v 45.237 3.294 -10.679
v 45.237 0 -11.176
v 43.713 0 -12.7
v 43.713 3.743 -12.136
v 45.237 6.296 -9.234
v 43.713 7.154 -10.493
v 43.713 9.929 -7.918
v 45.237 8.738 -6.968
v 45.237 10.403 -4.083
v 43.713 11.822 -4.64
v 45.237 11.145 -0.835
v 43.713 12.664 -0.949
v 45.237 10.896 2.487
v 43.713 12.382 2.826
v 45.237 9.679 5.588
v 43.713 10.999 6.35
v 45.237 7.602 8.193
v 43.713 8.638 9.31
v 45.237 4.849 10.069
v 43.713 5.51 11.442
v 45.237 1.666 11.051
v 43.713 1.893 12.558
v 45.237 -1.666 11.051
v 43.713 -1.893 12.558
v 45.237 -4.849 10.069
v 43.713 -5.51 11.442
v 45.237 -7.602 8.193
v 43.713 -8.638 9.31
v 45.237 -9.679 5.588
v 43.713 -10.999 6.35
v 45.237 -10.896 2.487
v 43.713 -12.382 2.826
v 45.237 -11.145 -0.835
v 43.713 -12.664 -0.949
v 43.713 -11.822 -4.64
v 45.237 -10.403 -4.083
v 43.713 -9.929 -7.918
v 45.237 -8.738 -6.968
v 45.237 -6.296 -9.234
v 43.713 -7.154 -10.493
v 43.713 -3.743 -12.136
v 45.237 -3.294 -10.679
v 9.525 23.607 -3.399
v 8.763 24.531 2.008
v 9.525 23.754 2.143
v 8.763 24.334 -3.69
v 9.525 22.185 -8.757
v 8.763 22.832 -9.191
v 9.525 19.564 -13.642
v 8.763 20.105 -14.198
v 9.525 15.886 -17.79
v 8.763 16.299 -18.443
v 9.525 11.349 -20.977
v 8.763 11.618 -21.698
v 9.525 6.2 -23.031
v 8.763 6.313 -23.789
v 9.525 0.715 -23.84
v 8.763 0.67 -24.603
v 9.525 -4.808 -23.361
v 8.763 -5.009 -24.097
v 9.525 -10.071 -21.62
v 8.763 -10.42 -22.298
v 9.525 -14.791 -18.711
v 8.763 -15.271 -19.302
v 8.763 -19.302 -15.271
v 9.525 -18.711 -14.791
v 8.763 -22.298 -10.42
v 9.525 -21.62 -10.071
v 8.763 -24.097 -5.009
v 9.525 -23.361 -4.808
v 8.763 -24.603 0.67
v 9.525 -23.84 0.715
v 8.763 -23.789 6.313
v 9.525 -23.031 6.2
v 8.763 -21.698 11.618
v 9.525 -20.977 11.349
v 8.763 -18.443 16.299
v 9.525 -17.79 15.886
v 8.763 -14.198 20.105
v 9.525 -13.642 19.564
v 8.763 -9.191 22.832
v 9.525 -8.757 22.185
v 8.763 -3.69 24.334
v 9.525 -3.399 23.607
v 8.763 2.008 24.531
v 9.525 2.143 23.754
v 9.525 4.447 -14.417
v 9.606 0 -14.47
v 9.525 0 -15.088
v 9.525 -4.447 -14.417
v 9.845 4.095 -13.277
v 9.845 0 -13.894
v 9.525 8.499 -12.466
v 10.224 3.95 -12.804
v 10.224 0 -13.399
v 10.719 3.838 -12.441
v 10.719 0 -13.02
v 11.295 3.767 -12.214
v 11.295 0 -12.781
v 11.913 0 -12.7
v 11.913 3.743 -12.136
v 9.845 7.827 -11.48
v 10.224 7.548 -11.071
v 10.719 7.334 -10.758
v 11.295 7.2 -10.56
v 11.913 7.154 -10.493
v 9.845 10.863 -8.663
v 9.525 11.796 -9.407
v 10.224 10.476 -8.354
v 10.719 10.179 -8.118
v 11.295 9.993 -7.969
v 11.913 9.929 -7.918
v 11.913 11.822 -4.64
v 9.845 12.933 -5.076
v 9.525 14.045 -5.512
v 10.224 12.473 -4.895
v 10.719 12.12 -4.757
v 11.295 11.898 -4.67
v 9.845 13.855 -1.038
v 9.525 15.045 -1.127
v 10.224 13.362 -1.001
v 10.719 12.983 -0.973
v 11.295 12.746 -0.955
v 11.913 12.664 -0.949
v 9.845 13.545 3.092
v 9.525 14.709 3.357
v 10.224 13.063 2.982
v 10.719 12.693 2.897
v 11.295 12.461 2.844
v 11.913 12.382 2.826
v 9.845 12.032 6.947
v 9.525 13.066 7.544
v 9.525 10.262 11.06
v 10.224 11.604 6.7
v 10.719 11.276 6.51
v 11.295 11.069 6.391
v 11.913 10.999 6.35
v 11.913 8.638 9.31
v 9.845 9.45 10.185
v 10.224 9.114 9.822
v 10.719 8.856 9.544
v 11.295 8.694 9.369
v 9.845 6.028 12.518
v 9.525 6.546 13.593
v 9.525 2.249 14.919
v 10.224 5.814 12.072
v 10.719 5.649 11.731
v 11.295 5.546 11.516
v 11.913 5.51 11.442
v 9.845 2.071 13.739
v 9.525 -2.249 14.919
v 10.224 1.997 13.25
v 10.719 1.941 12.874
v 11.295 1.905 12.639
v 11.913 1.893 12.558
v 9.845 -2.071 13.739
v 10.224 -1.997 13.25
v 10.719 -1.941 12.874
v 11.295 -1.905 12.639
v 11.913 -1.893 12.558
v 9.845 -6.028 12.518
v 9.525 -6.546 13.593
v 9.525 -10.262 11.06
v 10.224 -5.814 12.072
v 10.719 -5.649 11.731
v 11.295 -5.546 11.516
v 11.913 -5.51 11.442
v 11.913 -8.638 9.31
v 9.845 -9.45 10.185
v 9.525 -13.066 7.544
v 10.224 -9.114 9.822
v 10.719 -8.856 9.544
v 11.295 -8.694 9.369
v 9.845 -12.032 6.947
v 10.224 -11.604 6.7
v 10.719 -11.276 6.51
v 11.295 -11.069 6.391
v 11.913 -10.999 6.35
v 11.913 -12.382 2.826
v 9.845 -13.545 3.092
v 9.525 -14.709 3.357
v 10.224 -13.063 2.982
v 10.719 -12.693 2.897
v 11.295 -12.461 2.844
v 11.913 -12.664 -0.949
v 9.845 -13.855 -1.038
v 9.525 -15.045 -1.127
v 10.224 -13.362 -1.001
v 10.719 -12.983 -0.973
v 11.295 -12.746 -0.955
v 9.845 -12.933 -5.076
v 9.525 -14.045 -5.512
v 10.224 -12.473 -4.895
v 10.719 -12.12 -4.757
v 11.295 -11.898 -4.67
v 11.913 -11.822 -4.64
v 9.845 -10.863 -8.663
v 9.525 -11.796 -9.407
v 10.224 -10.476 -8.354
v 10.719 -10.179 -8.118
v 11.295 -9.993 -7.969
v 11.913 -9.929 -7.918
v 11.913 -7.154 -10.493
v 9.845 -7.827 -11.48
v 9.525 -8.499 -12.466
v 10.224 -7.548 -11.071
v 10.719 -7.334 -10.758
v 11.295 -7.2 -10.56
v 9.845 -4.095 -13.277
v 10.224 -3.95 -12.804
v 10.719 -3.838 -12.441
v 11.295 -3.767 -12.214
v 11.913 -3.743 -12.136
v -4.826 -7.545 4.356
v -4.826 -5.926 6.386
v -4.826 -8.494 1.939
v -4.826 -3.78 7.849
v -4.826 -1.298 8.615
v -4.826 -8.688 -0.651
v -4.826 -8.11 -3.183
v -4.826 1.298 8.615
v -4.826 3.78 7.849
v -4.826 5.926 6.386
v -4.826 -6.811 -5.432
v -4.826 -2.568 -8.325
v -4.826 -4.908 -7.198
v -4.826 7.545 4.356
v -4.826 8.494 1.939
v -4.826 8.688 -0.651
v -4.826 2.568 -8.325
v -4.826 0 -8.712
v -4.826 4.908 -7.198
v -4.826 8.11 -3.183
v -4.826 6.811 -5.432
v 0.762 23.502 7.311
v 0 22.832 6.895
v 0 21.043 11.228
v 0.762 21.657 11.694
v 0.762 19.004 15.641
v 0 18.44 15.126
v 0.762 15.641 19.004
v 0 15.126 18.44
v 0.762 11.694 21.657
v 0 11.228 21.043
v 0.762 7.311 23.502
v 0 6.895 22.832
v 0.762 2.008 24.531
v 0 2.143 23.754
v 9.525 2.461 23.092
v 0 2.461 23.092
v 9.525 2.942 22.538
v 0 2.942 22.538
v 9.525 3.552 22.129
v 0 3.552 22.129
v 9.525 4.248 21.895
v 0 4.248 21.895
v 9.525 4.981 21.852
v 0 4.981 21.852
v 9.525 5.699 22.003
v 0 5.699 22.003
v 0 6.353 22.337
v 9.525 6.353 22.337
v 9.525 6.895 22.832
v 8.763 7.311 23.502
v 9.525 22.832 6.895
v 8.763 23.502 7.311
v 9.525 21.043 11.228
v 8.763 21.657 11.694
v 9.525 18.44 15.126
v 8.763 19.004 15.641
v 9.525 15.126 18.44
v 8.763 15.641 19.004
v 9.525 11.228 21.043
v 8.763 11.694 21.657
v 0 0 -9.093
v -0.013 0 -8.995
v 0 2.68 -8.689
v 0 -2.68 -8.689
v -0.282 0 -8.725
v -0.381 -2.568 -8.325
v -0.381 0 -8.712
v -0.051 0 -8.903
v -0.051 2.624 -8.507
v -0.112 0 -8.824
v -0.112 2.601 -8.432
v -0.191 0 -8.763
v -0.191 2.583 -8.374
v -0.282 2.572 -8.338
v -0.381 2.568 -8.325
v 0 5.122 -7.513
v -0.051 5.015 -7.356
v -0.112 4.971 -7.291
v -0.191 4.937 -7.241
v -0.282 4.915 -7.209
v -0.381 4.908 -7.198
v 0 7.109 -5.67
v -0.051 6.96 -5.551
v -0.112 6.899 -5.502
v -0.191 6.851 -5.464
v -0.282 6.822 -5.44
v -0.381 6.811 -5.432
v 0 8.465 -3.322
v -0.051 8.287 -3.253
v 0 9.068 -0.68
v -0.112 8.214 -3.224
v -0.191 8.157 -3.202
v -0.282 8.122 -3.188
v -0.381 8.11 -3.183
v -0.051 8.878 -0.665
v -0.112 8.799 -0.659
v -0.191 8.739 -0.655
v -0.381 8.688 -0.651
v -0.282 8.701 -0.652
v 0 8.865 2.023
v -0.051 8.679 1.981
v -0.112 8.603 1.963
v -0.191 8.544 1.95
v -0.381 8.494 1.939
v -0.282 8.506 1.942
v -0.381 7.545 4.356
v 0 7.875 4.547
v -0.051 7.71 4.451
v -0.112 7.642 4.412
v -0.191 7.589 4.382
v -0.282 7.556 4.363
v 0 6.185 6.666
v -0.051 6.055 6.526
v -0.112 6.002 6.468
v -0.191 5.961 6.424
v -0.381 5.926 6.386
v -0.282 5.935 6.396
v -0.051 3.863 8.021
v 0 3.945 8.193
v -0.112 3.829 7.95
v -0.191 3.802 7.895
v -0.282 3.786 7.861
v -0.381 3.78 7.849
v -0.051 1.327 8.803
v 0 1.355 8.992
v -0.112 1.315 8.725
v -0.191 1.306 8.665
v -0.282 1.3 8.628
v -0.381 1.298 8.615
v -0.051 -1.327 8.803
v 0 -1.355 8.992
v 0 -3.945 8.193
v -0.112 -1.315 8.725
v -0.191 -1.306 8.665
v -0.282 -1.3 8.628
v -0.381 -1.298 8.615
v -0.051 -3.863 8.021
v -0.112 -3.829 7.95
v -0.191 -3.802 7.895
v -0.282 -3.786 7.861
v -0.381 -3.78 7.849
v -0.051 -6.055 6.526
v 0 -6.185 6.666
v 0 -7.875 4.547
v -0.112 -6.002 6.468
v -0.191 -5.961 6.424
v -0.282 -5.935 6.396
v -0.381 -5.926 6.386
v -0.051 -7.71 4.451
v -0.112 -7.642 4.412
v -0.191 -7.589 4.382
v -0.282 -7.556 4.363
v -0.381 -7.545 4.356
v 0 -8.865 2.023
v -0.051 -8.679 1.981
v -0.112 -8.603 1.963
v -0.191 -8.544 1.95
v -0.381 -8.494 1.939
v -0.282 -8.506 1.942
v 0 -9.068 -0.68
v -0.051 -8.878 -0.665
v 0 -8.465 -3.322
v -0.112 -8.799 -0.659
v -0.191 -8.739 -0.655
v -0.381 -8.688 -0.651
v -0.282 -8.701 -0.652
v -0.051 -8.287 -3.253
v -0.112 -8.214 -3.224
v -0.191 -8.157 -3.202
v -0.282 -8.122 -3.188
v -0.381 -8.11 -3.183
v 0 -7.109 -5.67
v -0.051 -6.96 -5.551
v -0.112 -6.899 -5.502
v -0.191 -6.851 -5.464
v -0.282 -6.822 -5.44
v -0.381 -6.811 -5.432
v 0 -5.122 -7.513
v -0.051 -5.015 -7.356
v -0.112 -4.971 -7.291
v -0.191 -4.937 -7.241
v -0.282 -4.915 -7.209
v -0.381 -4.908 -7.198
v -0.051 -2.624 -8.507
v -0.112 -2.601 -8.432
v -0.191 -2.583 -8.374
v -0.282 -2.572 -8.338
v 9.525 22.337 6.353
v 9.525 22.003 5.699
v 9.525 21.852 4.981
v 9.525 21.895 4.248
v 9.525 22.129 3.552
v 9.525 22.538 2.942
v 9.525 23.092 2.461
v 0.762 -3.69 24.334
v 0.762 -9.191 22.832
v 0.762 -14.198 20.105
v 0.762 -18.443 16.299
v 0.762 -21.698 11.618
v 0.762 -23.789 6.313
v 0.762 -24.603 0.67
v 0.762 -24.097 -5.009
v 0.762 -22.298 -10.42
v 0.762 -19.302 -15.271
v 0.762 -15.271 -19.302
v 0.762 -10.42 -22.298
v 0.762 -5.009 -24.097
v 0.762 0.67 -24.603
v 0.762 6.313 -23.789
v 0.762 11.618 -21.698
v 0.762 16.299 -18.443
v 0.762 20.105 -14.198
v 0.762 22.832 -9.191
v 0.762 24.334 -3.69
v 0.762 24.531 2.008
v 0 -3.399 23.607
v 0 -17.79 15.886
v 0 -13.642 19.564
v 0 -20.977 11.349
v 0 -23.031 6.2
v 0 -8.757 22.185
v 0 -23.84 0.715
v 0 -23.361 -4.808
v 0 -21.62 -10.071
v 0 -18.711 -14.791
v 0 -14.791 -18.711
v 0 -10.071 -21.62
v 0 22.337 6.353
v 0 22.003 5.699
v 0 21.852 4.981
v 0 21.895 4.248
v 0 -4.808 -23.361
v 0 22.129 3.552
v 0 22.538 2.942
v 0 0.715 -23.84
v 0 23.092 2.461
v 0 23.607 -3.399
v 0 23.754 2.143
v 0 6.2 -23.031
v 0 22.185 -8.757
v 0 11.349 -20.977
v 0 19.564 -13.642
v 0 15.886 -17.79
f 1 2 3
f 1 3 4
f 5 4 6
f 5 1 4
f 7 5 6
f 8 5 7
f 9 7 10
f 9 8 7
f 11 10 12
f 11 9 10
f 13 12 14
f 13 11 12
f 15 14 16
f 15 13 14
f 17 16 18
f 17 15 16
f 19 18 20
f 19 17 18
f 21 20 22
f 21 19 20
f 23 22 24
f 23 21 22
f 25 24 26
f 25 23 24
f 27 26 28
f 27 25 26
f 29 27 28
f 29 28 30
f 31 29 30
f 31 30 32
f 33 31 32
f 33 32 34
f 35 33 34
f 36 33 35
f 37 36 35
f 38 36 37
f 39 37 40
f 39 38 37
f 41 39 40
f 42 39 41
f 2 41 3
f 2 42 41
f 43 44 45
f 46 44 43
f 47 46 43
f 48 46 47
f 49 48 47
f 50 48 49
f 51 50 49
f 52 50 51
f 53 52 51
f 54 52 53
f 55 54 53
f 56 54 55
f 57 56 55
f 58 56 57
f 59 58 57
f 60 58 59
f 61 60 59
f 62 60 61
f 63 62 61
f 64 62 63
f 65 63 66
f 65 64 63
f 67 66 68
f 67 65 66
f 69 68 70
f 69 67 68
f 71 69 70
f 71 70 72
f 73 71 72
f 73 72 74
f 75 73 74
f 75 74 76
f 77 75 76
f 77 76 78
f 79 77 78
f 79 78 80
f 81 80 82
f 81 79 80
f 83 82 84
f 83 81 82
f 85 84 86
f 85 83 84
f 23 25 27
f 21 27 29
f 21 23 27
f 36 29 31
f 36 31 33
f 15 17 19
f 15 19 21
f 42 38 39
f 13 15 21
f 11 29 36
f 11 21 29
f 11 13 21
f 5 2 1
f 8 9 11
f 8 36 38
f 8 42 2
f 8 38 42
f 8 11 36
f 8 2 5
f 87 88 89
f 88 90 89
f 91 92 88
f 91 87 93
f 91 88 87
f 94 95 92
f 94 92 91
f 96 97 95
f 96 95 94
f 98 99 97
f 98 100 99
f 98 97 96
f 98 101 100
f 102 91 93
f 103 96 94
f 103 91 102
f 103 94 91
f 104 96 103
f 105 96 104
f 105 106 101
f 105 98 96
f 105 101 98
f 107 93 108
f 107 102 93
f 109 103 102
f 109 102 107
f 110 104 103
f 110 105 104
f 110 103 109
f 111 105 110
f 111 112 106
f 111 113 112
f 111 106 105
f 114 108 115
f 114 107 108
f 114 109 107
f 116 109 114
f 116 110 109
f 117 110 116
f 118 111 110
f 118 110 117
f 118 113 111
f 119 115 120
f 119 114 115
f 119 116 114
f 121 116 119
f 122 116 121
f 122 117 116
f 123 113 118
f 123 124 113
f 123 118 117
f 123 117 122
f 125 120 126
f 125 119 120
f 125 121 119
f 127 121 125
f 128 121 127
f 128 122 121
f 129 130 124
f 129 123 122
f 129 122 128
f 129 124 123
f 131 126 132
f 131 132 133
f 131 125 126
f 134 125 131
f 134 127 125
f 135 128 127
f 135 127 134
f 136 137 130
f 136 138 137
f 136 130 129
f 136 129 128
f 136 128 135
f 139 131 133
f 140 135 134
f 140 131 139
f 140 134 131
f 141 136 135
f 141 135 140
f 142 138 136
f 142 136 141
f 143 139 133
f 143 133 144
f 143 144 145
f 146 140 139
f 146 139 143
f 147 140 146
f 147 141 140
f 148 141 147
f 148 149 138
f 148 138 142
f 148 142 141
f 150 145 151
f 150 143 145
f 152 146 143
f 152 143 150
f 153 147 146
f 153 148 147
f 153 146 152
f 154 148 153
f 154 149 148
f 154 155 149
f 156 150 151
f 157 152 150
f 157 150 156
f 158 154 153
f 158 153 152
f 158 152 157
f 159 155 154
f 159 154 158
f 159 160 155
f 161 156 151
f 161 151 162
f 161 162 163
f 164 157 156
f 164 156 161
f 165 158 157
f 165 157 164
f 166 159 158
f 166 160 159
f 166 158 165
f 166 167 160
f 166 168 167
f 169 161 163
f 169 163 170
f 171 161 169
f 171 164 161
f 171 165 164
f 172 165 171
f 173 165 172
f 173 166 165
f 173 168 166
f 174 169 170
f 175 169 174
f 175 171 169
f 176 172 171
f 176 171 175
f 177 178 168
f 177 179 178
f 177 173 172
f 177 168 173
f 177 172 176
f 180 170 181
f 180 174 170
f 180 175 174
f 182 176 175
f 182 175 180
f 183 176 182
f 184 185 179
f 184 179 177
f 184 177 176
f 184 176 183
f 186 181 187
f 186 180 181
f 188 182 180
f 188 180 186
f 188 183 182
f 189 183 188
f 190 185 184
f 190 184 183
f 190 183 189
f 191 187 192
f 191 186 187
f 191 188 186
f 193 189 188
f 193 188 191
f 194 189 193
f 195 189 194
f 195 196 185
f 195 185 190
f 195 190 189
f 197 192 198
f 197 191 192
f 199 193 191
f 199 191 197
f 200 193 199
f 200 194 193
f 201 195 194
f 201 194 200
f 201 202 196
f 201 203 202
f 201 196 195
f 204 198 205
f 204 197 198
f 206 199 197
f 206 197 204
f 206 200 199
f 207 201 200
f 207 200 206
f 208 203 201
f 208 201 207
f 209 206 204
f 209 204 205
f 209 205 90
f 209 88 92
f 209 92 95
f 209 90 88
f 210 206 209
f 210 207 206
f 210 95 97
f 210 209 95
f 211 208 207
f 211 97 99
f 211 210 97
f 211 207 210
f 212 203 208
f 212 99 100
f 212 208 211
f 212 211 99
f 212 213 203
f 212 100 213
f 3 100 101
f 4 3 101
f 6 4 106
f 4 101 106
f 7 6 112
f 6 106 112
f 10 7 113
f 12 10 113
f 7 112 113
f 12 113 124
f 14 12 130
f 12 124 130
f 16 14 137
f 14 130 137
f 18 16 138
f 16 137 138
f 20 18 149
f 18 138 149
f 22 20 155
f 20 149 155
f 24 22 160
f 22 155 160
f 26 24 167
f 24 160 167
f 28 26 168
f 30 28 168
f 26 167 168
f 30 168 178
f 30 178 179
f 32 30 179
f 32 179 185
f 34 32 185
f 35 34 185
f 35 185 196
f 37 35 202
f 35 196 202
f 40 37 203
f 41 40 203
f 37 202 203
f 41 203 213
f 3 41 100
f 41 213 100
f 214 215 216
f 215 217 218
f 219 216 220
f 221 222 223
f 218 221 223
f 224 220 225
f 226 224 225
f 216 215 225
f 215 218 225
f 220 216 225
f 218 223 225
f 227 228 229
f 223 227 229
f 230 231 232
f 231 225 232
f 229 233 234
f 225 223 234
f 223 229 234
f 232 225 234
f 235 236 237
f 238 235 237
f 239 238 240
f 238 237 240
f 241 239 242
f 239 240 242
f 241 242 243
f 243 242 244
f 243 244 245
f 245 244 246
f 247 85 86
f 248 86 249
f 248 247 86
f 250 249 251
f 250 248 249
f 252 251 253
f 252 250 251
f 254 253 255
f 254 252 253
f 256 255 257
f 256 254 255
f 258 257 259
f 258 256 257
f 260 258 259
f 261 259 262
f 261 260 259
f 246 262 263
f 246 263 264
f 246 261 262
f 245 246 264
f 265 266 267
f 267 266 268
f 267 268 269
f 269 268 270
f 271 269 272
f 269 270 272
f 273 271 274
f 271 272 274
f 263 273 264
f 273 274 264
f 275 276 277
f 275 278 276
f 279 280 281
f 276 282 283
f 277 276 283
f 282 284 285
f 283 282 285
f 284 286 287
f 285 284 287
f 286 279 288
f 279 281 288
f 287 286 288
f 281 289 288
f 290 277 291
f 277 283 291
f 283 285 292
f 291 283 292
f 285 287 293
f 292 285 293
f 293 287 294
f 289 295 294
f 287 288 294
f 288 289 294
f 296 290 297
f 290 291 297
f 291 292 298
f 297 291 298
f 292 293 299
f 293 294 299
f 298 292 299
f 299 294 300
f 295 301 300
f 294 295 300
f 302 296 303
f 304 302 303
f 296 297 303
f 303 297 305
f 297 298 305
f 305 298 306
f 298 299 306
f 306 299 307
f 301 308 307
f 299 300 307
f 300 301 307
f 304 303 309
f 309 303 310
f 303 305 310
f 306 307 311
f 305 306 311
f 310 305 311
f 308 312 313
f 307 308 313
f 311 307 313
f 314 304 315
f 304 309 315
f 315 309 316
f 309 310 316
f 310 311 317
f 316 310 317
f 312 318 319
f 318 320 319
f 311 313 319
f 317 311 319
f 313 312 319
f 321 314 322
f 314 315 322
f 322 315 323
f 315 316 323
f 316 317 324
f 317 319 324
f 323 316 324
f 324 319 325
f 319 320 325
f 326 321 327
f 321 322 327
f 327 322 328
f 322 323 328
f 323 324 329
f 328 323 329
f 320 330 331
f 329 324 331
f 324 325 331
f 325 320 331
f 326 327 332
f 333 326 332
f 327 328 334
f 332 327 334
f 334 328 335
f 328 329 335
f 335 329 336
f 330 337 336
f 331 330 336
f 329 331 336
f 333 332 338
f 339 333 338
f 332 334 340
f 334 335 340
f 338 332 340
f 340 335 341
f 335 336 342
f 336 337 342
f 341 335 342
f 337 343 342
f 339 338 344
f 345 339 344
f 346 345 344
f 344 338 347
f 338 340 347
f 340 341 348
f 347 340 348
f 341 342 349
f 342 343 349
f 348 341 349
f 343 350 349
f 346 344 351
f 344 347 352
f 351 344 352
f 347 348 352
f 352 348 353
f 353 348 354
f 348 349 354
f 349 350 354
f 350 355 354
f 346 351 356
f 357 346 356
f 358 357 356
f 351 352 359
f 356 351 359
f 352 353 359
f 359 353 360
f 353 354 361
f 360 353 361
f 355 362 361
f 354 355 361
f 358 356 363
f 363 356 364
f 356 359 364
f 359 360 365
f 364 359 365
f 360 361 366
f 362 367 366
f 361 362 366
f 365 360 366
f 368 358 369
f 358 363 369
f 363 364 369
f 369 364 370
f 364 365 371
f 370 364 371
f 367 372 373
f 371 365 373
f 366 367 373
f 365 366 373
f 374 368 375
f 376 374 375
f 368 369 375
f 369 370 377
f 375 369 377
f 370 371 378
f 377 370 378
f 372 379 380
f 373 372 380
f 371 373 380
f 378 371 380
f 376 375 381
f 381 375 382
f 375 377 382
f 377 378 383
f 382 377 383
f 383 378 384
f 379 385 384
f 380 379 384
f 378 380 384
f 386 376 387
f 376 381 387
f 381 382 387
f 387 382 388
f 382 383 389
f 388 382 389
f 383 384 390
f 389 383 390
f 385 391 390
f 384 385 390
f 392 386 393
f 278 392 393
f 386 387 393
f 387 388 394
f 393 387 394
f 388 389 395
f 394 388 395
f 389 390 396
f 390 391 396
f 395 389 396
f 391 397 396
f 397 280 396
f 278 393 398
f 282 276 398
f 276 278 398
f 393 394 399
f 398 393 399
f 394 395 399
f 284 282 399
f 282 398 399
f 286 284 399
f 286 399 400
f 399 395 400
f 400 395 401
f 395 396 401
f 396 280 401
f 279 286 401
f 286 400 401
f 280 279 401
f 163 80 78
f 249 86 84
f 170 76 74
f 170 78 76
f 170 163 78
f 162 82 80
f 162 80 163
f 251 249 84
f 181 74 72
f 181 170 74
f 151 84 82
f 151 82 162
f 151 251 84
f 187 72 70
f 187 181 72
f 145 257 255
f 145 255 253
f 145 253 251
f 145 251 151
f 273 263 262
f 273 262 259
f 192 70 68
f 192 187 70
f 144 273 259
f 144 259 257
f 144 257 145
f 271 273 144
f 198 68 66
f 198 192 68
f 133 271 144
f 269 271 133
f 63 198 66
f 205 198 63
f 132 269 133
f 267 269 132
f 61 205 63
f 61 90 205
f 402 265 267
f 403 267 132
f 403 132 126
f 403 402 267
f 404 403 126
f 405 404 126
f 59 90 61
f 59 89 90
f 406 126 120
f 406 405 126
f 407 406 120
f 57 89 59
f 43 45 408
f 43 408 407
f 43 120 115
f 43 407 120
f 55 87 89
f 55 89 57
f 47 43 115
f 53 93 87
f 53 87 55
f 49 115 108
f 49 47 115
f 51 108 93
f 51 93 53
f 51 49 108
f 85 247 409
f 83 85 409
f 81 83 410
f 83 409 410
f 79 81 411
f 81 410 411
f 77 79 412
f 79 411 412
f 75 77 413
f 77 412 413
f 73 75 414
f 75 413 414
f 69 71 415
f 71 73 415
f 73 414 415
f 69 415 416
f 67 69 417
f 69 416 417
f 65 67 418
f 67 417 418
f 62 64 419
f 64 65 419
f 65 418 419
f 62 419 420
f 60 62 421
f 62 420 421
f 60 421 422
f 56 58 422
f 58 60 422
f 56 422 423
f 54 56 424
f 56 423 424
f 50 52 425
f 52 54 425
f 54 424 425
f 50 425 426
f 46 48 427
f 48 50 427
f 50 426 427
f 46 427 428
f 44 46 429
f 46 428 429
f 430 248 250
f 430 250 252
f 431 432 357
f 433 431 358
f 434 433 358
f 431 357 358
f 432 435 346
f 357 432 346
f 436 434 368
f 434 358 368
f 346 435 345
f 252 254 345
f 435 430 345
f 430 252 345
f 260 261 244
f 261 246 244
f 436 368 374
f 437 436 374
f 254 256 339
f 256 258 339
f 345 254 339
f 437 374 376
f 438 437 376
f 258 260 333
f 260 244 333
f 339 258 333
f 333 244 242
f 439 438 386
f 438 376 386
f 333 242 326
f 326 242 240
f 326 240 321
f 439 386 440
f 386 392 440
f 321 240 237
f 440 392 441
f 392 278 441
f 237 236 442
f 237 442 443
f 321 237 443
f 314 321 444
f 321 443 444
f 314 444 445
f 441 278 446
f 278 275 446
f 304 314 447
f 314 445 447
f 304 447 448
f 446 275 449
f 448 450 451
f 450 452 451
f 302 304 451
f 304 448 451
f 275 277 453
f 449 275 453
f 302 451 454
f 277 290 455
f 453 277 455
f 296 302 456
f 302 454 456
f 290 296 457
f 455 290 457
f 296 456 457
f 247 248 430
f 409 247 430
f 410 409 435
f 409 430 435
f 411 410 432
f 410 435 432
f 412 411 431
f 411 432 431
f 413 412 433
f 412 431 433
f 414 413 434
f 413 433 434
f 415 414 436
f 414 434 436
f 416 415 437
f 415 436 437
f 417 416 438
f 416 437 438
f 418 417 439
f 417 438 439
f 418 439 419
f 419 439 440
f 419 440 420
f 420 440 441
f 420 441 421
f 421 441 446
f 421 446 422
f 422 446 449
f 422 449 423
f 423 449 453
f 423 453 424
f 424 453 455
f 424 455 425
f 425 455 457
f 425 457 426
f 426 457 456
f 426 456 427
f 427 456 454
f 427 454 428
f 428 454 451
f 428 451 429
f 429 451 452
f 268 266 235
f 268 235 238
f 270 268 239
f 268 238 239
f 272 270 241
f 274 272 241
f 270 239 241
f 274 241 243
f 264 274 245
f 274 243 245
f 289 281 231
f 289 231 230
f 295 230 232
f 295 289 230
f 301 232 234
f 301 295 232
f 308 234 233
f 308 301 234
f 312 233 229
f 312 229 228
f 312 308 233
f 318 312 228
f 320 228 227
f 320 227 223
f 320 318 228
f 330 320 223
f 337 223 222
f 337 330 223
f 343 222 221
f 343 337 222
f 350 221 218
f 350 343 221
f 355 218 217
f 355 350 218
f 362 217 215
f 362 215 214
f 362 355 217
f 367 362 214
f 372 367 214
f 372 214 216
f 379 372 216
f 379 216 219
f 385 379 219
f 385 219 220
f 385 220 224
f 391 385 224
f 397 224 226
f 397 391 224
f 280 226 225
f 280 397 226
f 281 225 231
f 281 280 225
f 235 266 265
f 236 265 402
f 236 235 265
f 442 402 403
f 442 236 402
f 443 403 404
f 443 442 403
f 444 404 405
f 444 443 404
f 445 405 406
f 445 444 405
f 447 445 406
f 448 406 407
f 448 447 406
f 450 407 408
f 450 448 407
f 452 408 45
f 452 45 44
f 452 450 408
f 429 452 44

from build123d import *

# Parameters (mm, degrees)
SKETCH1_R           = 24.6126
BOSS_EXTRUDE1_DEPTH = 9.525
BOSS_EXTRUDE2_START = 9.525
SKETCH2_R           = 12.7
BOSS_EXTRUDE2_DEPTH = 35.7124
SKETCH3_R           = 8.7122
BOSS_EXTRUDE4_DEPTH = 4.826
SKETCH4_R           = 2.7686
CUT_EXTRUDE2_DEPTH  = 58.078739617
FILLET1_R           = 0.381
FILLET2_R           = 2.3876
CHAMFER1_SIZE       = 0.762
CHAMFER2_SIZE       = 1.524


with BuildPart() as part:
    # Sketch1 → Boss-Extrude1 (new body)
    with BuildSketch(Plane.YZ):
        with Locations(Location((0, 0, 0), (0, 0, 270))):
            Circle(SKETCH1_R)
    extrude(amount=BOSS_EXTRUDE1_DEPTH)

    # Sketch2 → Boss-Extrude2 (add)
    with BuildSketch(Plane.YZ.offset(BOSS_EXTRUDE2_START)):
        with Locations(Location((0, 0, 0), (0, 0, 270))):
            Circle(SKETCH2_R)
    extrude(amount=BOSS_EXTRUDE2_DEPTH)

    # Sketch3 → Boss-Extrude4 (add)
    with BuildSketch(Plane.YZ):
        with Locations(Location((0, 0, 0), (0, 0, 270))):
            Circle(SKETCH3_R)
    extrude(amount=-BOSS_EXTRUDE4_DEPTH)

    # Sketch4 → Cut-Extrude2 (cut, through all)
    with BuildSketch(Plane.YZ):
        with Locations((24.6126, 44.45)):
            Circle(SKETCH4_R)
        with Locations((44.45, 24.6126)):
            Circle(SKETCH4_R)
        with Locations((24.6126, 4.7752)):
            Circle(SKETCH4_R)
        with Locations((4.7752, 24.6126)):
            Circle(SKETCH4_R)
    extrude(amount=CUT_EXTRUDE2_DEPTH, mode=Mode.SUBTRACT)

    # Fillet1
    fillet1_edges = [part.edges().sort_by_distance(p)[0] for p in [
        (0, 0, 8.7122),
    ]]
    fillet(fillet1_edges, radius=FILLET1_R)

    # Fillet2
    fillet2_edges = [part.edges().sort_by_distance(p)[0] for p in [
        (9.525, 0, 12.7),
    ]]
    fillet(fillet2_edges, radius=FILLET2_R)

    # Chamfer1
    chamfer1_edges = [part.edges().sort_by_distance(p)[0] for p in [
        (0, 17.403736363, 17.403736363),
        (0, -17.403736363, -17.403736363),
        (9.525, 17.403736363, 17.403736363),
        (9.525, -17.403736363, -17.403736363),
    ]]
    chamfer(chamfer1_edges, length=CHAMFER1_SIZE)

    # Chamfer2
    chamfer2_edges = [part.edges().sort_by_distance(p)[0] for p in [
        (45.2374, 0, 12.7),
    ]]
    chamfer(chamfer2_edges, length=CHAMFER2_SIZE)


solid = part.part
